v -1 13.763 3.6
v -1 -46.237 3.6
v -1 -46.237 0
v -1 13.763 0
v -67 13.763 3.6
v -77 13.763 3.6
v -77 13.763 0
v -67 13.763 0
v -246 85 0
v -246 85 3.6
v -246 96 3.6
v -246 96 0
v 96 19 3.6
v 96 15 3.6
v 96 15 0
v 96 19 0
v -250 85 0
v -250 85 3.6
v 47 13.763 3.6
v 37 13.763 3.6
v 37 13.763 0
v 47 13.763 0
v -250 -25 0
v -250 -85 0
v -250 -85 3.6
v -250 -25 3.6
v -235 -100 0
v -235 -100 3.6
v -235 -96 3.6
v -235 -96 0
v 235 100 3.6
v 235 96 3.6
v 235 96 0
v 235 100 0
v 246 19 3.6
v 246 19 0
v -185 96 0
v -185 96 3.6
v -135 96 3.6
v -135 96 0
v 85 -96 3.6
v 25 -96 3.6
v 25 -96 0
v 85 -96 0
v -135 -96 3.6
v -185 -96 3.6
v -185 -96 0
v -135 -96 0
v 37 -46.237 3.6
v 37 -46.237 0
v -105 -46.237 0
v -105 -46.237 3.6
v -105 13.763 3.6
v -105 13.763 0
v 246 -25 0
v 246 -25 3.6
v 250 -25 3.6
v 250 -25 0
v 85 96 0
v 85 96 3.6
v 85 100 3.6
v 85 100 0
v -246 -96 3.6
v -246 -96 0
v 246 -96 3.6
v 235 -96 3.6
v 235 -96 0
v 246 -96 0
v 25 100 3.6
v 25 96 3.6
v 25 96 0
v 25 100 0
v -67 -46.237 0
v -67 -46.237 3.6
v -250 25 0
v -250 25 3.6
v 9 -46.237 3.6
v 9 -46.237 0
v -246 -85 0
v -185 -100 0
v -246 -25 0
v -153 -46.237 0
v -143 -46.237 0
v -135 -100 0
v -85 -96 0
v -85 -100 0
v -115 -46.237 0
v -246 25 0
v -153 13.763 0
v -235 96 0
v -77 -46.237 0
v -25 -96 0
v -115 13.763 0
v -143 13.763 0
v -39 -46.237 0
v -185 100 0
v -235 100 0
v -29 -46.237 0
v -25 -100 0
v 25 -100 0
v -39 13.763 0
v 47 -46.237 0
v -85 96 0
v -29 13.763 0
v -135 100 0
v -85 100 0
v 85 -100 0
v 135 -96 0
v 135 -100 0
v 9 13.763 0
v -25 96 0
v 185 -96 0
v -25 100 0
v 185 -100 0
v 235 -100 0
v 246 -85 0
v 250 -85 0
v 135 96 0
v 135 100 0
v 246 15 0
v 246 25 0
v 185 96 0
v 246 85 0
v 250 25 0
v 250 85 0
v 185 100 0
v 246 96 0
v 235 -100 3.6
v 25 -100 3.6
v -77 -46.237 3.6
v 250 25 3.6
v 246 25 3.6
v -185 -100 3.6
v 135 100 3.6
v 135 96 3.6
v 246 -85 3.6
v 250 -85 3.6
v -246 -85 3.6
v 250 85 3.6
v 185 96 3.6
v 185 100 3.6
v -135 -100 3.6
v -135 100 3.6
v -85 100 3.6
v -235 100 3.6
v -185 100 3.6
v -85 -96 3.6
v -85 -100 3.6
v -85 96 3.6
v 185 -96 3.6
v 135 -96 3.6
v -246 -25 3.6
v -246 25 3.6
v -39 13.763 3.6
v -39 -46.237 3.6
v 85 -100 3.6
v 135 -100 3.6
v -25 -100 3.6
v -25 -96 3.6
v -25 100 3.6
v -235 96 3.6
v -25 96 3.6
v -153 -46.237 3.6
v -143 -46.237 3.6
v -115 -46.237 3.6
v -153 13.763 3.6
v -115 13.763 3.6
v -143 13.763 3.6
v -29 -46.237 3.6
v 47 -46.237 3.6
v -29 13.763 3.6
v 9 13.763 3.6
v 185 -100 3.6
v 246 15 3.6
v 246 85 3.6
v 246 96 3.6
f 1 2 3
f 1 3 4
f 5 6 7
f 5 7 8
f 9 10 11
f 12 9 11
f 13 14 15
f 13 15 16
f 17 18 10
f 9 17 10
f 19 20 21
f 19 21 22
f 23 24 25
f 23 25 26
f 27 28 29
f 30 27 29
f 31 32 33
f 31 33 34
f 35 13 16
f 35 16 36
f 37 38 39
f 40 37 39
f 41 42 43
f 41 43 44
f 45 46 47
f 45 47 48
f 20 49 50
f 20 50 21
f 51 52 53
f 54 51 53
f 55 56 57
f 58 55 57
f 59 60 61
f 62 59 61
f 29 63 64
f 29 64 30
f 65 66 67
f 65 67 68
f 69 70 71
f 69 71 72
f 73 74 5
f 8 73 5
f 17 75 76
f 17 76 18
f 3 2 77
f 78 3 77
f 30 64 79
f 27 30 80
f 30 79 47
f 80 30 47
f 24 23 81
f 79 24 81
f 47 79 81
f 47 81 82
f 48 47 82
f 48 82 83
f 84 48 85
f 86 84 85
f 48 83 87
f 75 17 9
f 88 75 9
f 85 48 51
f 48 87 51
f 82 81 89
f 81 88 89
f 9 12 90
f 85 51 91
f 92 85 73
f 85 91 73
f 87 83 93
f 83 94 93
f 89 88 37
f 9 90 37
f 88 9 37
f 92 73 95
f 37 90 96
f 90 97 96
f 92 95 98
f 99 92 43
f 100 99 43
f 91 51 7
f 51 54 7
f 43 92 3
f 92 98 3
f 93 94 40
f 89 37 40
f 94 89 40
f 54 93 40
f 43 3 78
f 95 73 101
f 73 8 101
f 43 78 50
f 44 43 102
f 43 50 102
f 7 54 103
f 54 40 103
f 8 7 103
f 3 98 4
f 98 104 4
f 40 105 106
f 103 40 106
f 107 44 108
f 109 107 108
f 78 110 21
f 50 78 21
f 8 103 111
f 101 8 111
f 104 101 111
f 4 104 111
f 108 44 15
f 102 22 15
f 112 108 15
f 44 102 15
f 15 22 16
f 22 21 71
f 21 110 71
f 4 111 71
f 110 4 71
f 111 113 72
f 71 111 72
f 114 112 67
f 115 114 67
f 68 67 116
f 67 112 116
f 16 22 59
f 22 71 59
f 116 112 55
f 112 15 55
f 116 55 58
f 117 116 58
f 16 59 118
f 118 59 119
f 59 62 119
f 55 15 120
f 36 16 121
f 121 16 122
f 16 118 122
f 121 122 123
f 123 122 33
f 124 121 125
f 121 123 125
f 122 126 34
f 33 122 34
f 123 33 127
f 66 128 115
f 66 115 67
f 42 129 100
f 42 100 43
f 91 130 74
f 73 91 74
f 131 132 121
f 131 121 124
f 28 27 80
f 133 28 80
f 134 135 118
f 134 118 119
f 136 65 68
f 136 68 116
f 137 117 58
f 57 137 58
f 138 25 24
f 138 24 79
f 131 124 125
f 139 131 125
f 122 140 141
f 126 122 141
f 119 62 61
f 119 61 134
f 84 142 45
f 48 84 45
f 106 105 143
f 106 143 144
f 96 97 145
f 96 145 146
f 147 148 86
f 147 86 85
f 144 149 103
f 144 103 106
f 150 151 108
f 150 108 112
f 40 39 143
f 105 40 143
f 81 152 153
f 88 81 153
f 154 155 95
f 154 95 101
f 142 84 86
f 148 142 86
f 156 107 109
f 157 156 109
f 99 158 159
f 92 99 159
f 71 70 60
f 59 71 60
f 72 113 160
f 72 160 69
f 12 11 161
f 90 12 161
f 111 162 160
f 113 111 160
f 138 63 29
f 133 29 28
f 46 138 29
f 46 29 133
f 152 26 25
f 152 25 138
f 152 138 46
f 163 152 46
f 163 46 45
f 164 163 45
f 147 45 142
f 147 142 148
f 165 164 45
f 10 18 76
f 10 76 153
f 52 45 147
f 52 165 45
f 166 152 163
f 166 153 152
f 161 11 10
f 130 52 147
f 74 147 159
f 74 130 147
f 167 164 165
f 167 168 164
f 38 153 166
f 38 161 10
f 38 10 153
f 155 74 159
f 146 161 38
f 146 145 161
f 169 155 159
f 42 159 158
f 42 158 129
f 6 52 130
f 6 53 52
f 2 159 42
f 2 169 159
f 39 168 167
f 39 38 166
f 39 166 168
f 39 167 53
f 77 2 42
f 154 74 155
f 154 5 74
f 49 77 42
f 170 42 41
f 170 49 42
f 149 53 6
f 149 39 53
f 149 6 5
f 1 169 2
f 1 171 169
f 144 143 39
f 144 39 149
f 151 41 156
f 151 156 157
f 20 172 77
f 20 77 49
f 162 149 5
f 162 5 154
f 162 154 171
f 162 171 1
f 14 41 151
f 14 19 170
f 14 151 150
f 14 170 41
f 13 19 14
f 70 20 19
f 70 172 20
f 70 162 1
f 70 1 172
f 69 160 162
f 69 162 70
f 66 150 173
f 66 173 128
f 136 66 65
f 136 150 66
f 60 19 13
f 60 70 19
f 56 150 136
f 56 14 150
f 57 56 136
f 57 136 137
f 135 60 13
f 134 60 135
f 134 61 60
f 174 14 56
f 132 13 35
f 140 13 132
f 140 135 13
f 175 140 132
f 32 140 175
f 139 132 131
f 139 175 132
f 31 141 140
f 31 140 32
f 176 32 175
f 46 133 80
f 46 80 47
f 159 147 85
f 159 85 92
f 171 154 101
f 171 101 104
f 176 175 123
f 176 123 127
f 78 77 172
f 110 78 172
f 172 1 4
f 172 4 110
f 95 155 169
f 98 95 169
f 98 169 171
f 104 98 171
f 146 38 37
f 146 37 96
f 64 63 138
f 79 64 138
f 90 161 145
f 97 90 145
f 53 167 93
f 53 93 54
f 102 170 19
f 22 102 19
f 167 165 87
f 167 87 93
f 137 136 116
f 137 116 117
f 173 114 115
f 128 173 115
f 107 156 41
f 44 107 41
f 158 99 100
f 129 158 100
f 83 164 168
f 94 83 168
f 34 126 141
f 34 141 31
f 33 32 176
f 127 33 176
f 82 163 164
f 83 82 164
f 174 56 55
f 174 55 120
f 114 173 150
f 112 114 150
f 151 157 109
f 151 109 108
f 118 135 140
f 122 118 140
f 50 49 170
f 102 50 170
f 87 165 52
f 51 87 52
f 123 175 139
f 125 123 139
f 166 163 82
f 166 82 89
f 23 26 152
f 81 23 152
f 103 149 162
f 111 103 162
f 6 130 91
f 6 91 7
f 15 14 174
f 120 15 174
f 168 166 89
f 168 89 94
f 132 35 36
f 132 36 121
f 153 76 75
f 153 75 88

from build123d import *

# Parameters (mm, degrees)
SKETCH_1_W          = 500
SKETCH_1_H          = 200
EXTRUDE_1_DEPTH     = 3.6
SKETCH_3_W          = 4
SKETCH_3_H          = 50
CUT_EXTRUDE_2_DEPTH = 3.6
SKETCH_4_W          = 56.911563003
SKETCH_4_H          = 4
SKETCH_4_W_2        = 50
SKETCH_4_W_3        = 60
SKETCH_4_W_4        = 57.96169575
CUT_EXTRUDE_3_DEPTH = 10
SKETCH_5_W          = 10
SKETCH_5_H          = 60
CUT_EXTRUDE_4_DEPTH = 270.282305397
SKETCH_6_W          = 194.899640321
SKETCH_6_H          = 4
CUT_EXTRUDE_5_DEPTH = 270.282305397


with BuildPart() as part:
    # 草图1 → 凸台-拉伸1 (new body)
    with BuildSketch(Plane.XY):
        Rectangle(SKETCH_1_W, SKETCH_1_H)
    extrude(amount=EXTRUDE_1_DEPTH)

    # 草图3 → 切除-拉伸2 (cut)
    with BuildSketch(Plane.XY.offset(3.6)):
        with Locations((-248, 0)):
            Rectangle(SKETCH_3_W, SKETCH_3_H)
        with Locations((-248, 110)):
            Rectangle(SKETCH_3_W, SKETCH_3_H)
        with Locations((-248, -110)):
            Rectangle(SKETCH_3_W, SKETCH_3_H)
        with Locations((248, 110)):
            Rectangle(SKETCH_3_W, SKETCH_3_H)
        with Locations((248, 0)):
            Rectangle(SKETCH_3_W, SKETCH_3_H)
        with Locations((248, -110)):
            Rectangle(SKETCH_3_W, SKETCH_3_H)
    extrude(amount=-CUT_EXTRUDE_2_DEPTH, mode=Mode.SUBTRACT)

    # 草图4 → 切除-拉伸3 (cut)
    with BuildSketch(Plane.XY.offset(3.6)):
        with Locations((-263.455781502, -98)):
            Rectangle(SKETCH_4_W, SKETCH_4_H)
        with Locations((-160, -98)):
            Rectangle(SKETCH_4_W_2, SKETCH_4_H)
        with Locations((-55, -98)):
            Rectangle(SKETCH_4_W_3, SKETCH_4_H)
        with Locations((55, -98)):
            Rectangle(SKETCH_4_W_3, SKETCH_4_H)
        with Locations((160, -98)):
            Rectangle(SKETCH_4_W_2, SKETCH_4_H)
        with Locations((263.980847875, -98)):
            Rectangle(SKETCH_4_W_4, SKETCH_4_H)
        with Locations((263.980847875, 98)):
            Rectangle(SKETCH_4_W_4, SKETCH_4_H)
        with Locations((160, 98)):
            Rectangle(SKETCH_4_W_2, SKETCH_4_H)
        with Locations((55, 98)):
            Rectangle(SKETCH_4_W_3, SKETCH_4_H)
        with Locations((-55, 98)):
            Rectangle(SKETCH_4_W_3, SKETCH_4_H)
        with Locations((-160, 98)):
            Rectangle(SKETCH_4_W_2, SKETCH_4_H)
        with Locations((-263.455781502, 98)):
            Rectangle(SKETCH_4_W, SKETCH_4_H)
    extrude(amount=-CUT_EXTRUDE_3_DEPTH, mode=Mode.SUBTRACT)

    # 草图5 → 切除-拉伸4 (cut, through all)
    with BuildSketch(Plane.XY.offset(3.6)):
        with Locations((-148, -16.237417244)):
            Rectangle(SKETCH_5_W, SKETCH_5_H)
        with Locations((-110, -16.237417244)):
            Rectangle(SKETCH_5_W, SKETCH_5_H)
        with Locations((-72, -16.237417244)):
            Rectangle(SKETCH_5_W, SKETCH_5_H)
        with Locations((-34, -16.237417244)):
            Rectangle(SKETCH_5_W, SKETCH_5_H)
        with Locations((4, -16.237417244)):
            Rectangle(SKETCH_5_W, SKETCH_5_H)
        with Locations((42, -16.237417244)):
            Rectangle(SKETCH_5_W, SKETCH_5_H)
    extrude(amount=-CUT_EXTRUDE_4_DEPTH, mode=Mode.SUBTRACT)

    # 草图6 → 切除-拉伸5 (cut, through all)
    with BuildSketch(Plane.XY.offset(3.6)):
        with Locations((193.44982016, 17)):
            Rectangle(SKETCH_6_W, SKETCH_6_H)
    extrude(amount=-CUT_EXTRUDE_5_DEPTH, mode=Mode.SUBTRACT)


solid = part.part
